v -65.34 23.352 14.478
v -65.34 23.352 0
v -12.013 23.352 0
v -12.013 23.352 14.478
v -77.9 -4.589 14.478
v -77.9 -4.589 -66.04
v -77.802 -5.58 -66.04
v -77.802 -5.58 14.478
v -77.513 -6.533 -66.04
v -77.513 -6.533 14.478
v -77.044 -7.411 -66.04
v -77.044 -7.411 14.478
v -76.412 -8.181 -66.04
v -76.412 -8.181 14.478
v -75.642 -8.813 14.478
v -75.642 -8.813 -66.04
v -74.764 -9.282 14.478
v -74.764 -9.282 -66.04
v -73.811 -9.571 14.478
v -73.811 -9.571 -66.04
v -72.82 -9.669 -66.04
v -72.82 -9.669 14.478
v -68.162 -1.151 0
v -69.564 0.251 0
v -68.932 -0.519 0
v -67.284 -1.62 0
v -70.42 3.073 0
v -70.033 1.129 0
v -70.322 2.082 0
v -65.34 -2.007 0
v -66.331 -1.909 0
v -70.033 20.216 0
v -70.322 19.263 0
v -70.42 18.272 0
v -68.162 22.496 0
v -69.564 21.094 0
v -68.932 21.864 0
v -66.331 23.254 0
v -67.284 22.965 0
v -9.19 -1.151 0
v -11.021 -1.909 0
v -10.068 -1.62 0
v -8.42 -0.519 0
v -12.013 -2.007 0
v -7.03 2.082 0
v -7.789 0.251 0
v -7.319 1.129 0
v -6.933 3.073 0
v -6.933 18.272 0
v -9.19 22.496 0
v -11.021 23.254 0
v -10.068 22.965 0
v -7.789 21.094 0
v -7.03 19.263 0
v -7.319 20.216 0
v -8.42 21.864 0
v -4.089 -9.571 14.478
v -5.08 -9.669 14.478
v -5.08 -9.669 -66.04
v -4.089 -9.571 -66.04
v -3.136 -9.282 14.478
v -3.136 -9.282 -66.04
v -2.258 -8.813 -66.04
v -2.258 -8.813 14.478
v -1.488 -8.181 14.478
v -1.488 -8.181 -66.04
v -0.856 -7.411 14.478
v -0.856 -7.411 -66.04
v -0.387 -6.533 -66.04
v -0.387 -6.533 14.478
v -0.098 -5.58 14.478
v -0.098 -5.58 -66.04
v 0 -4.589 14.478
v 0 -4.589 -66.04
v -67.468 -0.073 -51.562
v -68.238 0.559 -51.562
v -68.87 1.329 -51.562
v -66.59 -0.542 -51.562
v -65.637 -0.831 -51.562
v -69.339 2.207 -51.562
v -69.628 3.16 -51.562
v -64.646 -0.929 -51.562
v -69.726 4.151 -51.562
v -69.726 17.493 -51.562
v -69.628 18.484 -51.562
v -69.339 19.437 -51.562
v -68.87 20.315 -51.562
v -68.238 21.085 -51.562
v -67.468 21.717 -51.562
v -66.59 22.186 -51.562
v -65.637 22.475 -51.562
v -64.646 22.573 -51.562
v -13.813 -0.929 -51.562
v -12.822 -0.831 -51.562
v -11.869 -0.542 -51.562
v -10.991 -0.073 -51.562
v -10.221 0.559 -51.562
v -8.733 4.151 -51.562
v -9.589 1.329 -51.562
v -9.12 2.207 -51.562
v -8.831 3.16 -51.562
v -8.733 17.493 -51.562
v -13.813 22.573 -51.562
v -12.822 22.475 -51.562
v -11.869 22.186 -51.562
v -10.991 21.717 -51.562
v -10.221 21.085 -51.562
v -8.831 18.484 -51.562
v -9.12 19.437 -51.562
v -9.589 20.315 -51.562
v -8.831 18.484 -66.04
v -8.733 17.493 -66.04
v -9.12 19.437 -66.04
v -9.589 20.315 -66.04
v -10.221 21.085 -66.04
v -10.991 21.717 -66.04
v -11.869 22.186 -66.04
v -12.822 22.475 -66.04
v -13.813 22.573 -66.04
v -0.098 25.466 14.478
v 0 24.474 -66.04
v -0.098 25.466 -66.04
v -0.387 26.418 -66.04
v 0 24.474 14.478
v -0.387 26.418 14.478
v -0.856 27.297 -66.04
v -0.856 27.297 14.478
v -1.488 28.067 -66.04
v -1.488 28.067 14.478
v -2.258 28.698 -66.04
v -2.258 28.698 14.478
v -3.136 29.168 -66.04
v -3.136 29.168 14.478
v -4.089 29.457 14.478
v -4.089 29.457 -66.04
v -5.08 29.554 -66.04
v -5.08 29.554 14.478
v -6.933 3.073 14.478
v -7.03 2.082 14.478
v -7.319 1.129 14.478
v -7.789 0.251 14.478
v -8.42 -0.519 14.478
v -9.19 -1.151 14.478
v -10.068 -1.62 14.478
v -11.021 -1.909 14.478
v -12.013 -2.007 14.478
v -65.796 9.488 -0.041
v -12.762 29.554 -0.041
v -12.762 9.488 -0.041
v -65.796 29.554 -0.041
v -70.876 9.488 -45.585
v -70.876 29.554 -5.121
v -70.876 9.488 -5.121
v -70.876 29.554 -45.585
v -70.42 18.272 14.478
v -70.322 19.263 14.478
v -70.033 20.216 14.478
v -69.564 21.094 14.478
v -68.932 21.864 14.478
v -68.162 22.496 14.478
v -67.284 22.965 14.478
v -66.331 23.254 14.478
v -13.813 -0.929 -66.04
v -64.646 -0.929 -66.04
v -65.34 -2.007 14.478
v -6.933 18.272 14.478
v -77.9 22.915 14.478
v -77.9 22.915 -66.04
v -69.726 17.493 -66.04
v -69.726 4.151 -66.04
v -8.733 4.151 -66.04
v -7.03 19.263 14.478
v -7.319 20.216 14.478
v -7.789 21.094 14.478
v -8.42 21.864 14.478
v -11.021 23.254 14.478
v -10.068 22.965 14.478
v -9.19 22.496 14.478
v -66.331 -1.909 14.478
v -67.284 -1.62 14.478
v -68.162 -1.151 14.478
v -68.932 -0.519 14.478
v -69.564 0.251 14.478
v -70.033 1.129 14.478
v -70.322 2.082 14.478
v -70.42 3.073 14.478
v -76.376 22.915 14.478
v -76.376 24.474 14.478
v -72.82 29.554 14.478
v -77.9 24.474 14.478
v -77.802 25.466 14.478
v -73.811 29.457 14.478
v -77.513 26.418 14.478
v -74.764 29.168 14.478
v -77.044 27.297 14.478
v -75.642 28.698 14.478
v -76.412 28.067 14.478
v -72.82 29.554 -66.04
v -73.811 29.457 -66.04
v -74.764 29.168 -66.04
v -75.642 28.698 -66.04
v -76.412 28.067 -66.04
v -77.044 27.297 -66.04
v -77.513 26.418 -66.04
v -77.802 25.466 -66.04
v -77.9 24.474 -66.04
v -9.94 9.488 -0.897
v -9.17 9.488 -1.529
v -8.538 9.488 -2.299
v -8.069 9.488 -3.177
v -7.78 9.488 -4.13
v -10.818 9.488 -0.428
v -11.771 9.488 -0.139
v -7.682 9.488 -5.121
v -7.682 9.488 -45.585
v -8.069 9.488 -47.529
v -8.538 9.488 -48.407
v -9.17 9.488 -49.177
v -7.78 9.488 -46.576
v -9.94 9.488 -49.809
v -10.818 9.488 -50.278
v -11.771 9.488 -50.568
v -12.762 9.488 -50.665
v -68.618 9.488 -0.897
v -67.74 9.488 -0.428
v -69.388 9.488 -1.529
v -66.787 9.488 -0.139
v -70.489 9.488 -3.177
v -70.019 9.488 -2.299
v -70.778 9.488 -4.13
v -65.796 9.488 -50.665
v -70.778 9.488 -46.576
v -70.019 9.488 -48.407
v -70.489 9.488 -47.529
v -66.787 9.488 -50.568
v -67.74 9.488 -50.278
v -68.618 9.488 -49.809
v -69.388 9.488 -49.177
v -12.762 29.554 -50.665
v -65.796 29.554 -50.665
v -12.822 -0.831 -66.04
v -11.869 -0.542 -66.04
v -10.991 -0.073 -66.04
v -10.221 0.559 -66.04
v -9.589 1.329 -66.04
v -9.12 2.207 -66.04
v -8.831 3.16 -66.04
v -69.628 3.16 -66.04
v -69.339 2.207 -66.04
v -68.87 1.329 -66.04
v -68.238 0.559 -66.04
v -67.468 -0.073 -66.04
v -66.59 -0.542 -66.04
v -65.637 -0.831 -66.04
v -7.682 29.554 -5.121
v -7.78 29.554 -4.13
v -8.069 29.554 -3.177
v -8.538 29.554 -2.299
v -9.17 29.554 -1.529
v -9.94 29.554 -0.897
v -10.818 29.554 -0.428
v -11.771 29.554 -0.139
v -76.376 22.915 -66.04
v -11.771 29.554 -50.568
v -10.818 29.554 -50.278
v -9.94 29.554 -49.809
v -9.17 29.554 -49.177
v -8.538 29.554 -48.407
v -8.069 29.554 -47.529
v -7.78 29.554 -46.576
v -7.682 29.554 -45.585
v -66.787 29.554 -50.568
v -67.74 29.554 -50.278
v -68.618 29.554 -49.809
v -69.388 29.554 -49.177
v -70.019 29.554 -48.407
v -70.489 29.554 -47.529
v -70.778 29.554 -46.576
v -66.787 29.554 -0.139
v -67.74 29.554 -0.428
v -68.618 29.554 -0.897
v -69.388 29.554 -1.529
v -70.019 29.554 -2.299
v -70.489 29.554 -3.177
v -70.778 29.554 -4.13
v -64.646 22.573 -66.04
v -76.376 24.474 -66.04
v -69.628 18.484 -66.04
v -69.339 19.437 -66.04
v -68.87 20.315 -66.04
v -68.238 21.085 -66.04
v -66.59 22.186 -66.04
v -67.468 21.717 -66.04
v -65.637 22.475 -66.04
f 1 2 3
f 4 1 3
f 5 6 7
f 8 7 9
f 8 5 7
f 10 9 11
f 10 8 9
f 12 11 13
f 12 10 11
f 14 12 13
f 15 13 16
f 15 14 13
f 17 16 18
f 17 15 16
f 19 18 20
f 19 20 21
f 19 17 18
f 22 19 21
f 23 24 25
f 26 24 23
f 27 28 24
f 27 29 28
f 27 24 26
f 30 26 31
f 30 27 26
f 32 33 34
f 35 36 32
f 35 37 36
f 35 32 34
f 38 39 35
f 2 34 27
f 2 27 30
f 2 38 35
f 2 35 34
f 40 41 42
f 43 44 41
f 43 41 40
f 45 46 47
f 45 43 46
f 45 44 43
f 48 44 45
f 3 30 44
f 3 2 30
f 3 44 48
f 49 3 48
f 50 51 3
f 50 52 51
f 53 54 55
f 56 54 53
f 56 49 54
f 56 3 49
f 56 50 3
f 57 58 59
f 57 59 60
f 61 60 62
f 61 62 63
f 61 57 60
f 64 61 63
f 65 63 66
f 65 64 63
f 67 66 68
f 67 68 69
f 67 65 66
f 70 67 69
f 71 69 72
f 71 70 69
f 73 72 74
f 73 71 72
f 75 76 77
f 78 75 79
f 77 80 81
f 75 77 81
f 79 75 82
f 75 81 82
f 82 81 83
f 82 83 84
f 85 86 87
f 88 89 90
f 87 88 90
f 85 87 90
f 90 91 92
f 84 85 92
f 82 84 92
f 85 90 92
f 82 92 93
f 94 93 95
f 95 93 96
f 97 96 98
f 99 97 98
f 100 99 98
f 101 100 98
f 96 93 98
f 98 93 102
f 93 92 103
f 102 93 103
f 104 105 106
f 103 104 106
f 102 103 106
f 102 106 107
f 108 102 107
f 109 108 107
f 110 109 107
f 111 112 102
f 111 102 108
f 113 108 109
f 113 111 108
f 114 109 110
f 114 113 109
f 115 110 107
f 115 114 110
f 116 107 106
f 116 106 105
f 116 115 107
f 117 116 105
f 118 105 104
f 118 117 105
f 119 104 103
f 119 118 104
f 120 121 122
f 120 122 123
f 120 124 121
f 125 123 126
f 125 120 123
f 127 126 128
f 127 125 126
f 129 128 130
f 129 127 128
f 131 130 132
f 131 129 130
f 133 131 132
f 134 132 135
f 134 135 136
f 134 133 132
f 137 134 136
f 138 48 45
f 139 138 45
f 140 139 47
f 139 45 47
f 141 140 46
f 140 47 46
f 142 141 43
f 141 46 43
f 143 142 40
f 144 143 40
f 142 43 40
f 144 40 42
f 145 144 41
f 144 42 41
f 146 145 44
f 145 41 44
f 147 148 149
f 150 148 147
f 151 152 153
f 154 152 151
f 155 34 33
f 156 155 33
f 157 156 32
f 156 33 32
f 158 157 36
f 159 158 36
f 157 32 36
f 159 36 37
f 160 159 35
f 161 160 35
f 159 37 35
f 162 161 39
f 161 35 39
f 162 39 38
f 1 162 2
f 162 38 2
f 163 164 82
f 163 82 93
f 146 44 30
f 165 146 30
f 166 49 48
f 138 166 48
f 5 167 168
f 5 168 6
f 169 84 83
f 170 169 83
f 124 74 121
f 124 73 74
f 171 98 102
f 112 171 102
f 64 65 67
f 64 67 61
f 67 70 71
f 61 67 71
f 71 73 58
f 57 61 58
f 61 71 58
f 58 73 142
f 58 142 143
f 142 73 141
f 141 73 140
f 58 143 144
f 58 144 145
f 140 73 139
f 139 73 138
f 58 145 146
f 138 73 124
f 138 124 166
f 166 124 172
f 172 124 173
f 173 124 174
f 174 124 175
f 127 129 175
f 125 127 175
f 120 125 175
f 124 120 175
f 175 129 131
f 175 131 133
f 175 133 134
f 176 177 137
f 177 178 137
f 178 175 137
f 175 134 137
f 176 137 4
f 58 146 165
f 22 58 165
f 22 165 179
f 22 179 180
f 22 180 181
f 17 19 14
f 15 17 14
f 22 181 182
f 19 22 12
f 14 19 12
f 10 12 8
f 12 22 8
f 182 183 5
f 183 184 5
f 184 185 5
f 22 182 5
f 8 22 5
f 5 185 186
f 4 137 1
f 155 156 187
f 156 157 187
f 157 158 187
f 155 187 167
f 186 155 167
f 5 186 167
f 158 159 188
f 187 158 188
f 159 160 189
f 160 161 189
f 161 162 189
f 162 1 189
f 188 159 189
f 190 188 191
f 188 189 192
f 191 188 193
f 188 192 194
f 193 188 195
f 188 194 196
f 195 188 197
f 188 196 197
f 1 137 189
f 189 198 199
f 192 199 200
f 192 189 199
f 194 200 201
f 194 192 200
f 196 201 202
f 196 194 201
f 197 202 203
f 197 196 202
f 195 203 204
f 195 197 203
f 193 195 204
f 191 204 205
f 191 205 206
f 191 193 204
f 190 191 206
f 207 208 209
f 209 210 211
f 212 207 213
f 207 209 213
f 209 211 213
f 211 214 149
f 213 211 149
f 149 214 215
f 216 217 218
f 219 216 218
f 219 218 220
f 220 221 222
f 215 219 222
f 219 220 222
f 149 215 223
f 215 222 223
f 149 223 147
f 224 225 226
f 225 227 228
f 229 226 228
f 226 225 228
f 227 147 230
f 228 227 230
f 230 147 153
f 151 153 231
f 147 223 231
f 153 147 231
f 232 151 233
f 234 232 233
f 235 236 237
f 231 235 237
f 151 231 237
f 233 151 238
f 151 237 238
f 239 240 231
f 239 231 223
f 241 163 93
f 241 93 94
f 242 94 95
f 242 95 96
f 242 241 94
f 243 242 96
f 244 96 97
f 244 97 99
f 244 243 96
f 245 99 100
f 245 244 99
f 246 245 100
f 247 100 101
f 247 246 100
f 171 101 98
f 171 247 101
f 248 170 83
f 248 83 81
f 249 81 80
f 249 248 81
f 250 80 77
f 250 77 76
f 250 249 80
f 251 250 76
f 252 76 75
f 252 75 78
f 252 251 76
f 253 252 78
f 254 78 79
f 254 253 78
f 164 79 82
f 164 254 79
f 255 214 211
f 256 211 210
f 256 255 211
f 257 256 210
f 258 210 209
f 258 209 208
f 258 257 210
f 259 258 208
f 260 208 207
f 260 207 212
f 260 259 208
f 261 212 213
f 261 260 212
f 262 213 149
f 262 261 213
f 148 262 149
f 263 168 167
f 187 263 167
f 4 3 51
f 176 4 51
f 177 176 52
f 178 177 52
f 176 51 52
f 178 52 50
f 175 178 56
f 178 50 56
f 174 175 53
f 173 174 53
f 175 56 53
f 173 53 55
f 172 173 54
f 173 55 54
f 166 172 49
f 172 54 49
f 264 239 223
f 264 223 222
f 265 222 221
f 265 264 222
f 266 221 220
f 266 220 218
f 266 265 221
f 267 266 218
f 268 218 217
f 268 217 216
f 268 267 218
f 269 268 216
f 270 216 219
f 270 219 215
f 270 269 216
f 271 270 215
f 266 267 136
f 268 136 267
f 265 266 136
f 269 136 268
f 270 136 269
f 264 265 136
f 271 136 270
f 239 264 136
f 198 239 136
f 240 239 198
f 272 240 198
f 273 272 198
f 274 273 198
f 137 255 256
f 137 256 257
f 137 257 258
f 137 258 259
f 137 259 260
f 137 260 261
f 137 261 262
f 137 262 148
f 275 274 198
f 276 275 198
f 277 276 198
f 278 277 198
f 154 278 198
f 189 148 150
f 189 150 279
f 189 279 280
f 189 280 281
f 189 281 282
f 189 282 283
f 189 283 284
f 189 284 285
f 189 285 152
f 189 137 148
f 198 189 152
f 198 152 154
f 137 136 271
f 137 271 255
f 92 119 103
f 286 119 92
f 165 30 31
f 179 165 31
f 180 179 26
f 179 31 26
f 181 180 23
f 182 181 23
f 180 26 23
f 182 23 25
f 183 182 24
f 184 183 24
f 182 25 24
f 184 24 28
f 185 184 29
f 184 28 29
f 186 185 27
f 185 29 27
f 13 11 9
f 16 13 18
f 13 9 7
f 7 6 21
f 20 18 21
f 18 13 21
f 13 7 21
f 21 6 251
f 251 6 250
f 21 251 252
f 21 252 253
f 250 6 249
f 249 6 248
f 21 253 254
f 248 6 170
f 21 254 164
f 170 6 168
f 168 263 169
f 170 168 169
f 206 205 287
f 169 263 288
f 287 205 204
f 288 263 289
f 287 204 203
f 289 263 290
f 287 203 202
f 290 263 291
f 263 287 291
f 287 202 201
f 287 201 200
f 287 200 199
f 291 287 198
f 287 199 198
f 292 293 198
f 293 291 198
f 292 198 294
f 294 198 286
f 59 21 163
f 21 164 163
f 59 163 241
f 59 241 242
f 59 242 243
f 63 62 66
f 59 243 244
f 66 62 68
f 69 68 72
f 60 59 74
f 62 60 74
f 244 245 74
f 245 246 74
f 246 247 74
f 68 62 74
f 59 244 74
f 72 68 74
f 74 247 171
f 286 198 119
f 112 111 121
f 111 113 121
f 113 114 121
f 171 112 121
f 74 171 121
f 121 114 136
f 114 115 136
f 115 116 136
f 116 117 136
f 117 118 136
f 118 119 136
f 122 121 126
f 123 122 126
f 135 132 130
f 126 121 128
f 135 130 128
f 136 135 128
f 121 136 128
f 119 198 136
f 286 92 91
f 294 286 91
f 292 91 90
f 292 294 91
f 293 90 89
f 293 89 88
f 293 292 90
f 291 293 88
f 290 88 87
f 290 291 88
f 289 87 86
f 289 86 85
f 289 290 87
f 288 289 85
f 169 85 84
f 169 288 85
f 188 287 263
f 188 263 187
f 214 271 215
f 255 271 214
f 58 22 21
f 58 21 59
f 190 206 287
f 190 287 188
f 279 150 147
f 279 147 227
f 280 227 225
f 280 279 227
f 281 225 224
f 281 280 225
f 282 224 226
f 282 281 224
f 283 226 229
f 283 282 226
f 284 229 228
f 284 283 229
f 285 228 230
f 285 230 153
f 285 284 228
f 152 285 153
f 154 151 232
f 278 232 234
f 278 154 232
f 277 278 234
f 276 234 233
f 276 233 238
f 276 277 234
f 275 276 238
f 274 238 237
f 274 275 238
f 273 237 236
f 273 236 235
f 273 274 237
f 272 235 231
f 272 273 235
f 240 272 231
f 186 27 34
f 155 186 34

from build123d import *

# Parameters (mm, degrees)
BOSS_EXTRUDE1_DEPTH = 14.478
BOSS_EXTRUDE2_DEPTH = 66.04
SKETCH3_W           = 80.518
SKETCH3_H           = 1.477027813
BOSS_EXTRUDE3_DEPTH = 1.524
SKETCH4_W           = 80.518
SKETCH4_H           = 1.559652671
CUT_EXTRUDE1_DEPTH  = 1.524
CUT_EXTRUDE3_DEPTH  = 14.478
CUT_EXTRUDE6_DEPTH  = 20.066


with BuildPart() as part:
    # Sketch1 → Boss-Extrude1 (new body)
    with BuildSketch(Plane.XY):
        with BuildLine():
            Line((-72.819716666, 29.55445925), (-5.08, 29.55445925))
            ThreePointArc((-5.08, 29.55445925), (-1.487897552, 28.066561699), (0, 24.47445925))
            Line((0, 24.47445925), (0, -4.589051483))
            ThreePointArc((0, -4.589051483), (-1.487897552, -8.181153932), (-5.08, -9.669051483))
            Line((-5.08, -9.669051483), (-72.819716666, -9.669051483))
            ThreePointArc((-72.819716666, -9.669051483), (-76.411819114, -8.181153932), (-77.899716666, -4.589051483))
            Line((-77.899716666, -4.589051483), (-77.899716666, 24.47445925))
            ThreePointArc((-77.899716666, 24.47445925), (-76.411819114, 28.066561699), (-72.819716666, 29.55445925))
        make_face()
        with BuildLine():
            Line((-65.339884386, 23.351671506), (-12.012527478, 23.351671506))
            ThreePointArc((-12.012527478, 23.351671506), (-8.42042503, 21.863773955), (-6.932527478, 18.271671506))
            Line((-6.932527478, 18.271671506), (-6.932527478, 3.07321573))
            ThreePointArc((-6.932527478, 3.07321573), (-8.42042503, -0.518886719), (-12.012527478, -2.00678427))
            Line((-12.012527478, -2.00678427), (-65.339884386, -2.00678427))
            ThreePointArc((-65.339884386, -2.00678427), (-68.931986835, -0.518886719), (-70.419884386, 3.07321573))
            Line((-70.419884386, 3.07321573), (-70.419884386, 18.271671506))
            ThreePointArc((-70.419884386, 18.271671506), (-68.931986835, 21.863773955), (-65.339884386, 23.351671506))
        make_face(mode=Mode.SUBTRACT)
    extrude(amount=BOSS_EXTRUDE1_DEPTH)

    # Sketch2 → Boss-Extrude2 (add)
    with BuildSketch(Plane(origin=(0, 0, 0), x_dir=(-1, 0, 0), z_dir=(0, 0, -1))):
        with BuildLine():
            Line((5.08, 29.55445925), (72.819716666, 29.55445925))
            ThreePointArc((72.819716666, 29.55445925), (76.411819114, 28.066561699), (77.899716666, 24.47445925))
            Line((77.899716666, 24.47445925), (77.899716666, -4.589051483))
            ThreePointArc((77.899716666, -4.589051483), (76.411819114, -8.181153932), (72.819716666, -9.669051483))
            Line((72.819716666, -9.669051483), (5.08, -9.669051483))
            ThreePointArc((5.08, -9.669051483), (1.487897552, -8.181153932), (0, -4.589051483))
            Line((0, -4.589051483), (0, 24.47445925))
            ThreePointArc((0, 24.47445925), (1.487897552, 28.066561699), (5.08, 29.55445925))
        make_face()
    extrude(amount=BOSS_EXTRUDE2_DEPTH)

    # Sketch3 → Boss-Extrude3 (add)
    with BuildSketch(Plane.ZY.offset(77.899716666)):
        with Locations((-25.781, 23.735945344)):
            Rectangle(SKETCH3_W, SKETCH3_H)
    extrude(amount=-BOSS_EXTRUDE3_DEPTH)

    # Sketch4 → Cut-Extrude1 (cut)
    with BuildSketch(Plane.ZY.offset(77.899716666)):
        with Locations((-25.781, 23.694632915)):
            Rectangle(SKETCH4_W, SKETCH4_H)
    extrude(amount=-CUT_EXTRUDE1_DEPTH, mode=Mode.SUBTRACT)

    # Sketch8 → Cut-Extrude3 (cut)
    with BuildSketch(Plane(origin=(0, 0.399775278, -66.04), x_dir=(-1, 0, 0), z_dir=(0, 0, -1))):
        with BuildLine():
            Line((13.813270209, 22.173227648), (64.646012904, 22.173227648))
            ThreePointArc((64.646012904, 22.173227648), (68.238115352, 20.685330097), (69.726012904, 17.093227648))
            Line((69.726012904, 17.093227648), (69.726012904, 3.751436885))
            ThreePointArc((69.726012904, 3.751436885), (68.238115352, 0.159334436), (64.646012904, -1.328563115))
            Line((64.646012904, -1.328563115), (13.813270209, -1.328563115))
            ThreePointArc((13.813270209, -1.328563115), (10.22116776, 0.159334436), (8.733270209, 3.751436885))
            Line((8.733270209, 3.751436885), (8.733270209, 17.093227648))
            ThreePointArc((8.733270209, 17.093227648), (10.22116776, 20.685330097), (13.813270209, 22.173227648))
        make_face()
    extrude(amount=-CUT_EXTRUDE3_DEPTH, mode=Mode.SUBTRACT)

    # Sketch10 → Cut-Extrude6 (cut)
    with BuildSketch(Plane(origin=(0, 29.55445925, 6.792687041), x_dir=(1, 0, 0), z_dir=(0, 1, 0))):
        with BuildLine():
            Line((-65.795513853, 57.457874707), (-12.761974665, 57.457874707))
            ThreePointArc((-12.761974665, 57.457874707), (-9.169872217, 55.969977155), (-7.681974665, 52.377874707))
            Line((-7.681974665, 52.377874707), (-7.681974665, 11.913822303))
            ThreePointArc((-7.681974665, 11.913822303), (-9.169872217, 8.321719854), (-12.761974665, 6.833822303))
            Line((-12.761974665, 6.833822303), (-65.795513853, 6.833822303))
            ThreePointArc((-65.795513853, 6.833822303), (-69.387616301, 8.321719854), (-70.875513853, 11.913822303))
            Line((-70.875513853, 11.913822303), (-70.875513853, 52.377874707))
            ThreePointArc((-70.875513853, 52.377874707), (-69.387616301, 55.969977155), (-65.795513853, 57.457874707))
        make_face()
    extrude(amount=-CUT_EXTRUDE6_DEPTH, mode=Mode.SUBTRACT)


solid = part.part
